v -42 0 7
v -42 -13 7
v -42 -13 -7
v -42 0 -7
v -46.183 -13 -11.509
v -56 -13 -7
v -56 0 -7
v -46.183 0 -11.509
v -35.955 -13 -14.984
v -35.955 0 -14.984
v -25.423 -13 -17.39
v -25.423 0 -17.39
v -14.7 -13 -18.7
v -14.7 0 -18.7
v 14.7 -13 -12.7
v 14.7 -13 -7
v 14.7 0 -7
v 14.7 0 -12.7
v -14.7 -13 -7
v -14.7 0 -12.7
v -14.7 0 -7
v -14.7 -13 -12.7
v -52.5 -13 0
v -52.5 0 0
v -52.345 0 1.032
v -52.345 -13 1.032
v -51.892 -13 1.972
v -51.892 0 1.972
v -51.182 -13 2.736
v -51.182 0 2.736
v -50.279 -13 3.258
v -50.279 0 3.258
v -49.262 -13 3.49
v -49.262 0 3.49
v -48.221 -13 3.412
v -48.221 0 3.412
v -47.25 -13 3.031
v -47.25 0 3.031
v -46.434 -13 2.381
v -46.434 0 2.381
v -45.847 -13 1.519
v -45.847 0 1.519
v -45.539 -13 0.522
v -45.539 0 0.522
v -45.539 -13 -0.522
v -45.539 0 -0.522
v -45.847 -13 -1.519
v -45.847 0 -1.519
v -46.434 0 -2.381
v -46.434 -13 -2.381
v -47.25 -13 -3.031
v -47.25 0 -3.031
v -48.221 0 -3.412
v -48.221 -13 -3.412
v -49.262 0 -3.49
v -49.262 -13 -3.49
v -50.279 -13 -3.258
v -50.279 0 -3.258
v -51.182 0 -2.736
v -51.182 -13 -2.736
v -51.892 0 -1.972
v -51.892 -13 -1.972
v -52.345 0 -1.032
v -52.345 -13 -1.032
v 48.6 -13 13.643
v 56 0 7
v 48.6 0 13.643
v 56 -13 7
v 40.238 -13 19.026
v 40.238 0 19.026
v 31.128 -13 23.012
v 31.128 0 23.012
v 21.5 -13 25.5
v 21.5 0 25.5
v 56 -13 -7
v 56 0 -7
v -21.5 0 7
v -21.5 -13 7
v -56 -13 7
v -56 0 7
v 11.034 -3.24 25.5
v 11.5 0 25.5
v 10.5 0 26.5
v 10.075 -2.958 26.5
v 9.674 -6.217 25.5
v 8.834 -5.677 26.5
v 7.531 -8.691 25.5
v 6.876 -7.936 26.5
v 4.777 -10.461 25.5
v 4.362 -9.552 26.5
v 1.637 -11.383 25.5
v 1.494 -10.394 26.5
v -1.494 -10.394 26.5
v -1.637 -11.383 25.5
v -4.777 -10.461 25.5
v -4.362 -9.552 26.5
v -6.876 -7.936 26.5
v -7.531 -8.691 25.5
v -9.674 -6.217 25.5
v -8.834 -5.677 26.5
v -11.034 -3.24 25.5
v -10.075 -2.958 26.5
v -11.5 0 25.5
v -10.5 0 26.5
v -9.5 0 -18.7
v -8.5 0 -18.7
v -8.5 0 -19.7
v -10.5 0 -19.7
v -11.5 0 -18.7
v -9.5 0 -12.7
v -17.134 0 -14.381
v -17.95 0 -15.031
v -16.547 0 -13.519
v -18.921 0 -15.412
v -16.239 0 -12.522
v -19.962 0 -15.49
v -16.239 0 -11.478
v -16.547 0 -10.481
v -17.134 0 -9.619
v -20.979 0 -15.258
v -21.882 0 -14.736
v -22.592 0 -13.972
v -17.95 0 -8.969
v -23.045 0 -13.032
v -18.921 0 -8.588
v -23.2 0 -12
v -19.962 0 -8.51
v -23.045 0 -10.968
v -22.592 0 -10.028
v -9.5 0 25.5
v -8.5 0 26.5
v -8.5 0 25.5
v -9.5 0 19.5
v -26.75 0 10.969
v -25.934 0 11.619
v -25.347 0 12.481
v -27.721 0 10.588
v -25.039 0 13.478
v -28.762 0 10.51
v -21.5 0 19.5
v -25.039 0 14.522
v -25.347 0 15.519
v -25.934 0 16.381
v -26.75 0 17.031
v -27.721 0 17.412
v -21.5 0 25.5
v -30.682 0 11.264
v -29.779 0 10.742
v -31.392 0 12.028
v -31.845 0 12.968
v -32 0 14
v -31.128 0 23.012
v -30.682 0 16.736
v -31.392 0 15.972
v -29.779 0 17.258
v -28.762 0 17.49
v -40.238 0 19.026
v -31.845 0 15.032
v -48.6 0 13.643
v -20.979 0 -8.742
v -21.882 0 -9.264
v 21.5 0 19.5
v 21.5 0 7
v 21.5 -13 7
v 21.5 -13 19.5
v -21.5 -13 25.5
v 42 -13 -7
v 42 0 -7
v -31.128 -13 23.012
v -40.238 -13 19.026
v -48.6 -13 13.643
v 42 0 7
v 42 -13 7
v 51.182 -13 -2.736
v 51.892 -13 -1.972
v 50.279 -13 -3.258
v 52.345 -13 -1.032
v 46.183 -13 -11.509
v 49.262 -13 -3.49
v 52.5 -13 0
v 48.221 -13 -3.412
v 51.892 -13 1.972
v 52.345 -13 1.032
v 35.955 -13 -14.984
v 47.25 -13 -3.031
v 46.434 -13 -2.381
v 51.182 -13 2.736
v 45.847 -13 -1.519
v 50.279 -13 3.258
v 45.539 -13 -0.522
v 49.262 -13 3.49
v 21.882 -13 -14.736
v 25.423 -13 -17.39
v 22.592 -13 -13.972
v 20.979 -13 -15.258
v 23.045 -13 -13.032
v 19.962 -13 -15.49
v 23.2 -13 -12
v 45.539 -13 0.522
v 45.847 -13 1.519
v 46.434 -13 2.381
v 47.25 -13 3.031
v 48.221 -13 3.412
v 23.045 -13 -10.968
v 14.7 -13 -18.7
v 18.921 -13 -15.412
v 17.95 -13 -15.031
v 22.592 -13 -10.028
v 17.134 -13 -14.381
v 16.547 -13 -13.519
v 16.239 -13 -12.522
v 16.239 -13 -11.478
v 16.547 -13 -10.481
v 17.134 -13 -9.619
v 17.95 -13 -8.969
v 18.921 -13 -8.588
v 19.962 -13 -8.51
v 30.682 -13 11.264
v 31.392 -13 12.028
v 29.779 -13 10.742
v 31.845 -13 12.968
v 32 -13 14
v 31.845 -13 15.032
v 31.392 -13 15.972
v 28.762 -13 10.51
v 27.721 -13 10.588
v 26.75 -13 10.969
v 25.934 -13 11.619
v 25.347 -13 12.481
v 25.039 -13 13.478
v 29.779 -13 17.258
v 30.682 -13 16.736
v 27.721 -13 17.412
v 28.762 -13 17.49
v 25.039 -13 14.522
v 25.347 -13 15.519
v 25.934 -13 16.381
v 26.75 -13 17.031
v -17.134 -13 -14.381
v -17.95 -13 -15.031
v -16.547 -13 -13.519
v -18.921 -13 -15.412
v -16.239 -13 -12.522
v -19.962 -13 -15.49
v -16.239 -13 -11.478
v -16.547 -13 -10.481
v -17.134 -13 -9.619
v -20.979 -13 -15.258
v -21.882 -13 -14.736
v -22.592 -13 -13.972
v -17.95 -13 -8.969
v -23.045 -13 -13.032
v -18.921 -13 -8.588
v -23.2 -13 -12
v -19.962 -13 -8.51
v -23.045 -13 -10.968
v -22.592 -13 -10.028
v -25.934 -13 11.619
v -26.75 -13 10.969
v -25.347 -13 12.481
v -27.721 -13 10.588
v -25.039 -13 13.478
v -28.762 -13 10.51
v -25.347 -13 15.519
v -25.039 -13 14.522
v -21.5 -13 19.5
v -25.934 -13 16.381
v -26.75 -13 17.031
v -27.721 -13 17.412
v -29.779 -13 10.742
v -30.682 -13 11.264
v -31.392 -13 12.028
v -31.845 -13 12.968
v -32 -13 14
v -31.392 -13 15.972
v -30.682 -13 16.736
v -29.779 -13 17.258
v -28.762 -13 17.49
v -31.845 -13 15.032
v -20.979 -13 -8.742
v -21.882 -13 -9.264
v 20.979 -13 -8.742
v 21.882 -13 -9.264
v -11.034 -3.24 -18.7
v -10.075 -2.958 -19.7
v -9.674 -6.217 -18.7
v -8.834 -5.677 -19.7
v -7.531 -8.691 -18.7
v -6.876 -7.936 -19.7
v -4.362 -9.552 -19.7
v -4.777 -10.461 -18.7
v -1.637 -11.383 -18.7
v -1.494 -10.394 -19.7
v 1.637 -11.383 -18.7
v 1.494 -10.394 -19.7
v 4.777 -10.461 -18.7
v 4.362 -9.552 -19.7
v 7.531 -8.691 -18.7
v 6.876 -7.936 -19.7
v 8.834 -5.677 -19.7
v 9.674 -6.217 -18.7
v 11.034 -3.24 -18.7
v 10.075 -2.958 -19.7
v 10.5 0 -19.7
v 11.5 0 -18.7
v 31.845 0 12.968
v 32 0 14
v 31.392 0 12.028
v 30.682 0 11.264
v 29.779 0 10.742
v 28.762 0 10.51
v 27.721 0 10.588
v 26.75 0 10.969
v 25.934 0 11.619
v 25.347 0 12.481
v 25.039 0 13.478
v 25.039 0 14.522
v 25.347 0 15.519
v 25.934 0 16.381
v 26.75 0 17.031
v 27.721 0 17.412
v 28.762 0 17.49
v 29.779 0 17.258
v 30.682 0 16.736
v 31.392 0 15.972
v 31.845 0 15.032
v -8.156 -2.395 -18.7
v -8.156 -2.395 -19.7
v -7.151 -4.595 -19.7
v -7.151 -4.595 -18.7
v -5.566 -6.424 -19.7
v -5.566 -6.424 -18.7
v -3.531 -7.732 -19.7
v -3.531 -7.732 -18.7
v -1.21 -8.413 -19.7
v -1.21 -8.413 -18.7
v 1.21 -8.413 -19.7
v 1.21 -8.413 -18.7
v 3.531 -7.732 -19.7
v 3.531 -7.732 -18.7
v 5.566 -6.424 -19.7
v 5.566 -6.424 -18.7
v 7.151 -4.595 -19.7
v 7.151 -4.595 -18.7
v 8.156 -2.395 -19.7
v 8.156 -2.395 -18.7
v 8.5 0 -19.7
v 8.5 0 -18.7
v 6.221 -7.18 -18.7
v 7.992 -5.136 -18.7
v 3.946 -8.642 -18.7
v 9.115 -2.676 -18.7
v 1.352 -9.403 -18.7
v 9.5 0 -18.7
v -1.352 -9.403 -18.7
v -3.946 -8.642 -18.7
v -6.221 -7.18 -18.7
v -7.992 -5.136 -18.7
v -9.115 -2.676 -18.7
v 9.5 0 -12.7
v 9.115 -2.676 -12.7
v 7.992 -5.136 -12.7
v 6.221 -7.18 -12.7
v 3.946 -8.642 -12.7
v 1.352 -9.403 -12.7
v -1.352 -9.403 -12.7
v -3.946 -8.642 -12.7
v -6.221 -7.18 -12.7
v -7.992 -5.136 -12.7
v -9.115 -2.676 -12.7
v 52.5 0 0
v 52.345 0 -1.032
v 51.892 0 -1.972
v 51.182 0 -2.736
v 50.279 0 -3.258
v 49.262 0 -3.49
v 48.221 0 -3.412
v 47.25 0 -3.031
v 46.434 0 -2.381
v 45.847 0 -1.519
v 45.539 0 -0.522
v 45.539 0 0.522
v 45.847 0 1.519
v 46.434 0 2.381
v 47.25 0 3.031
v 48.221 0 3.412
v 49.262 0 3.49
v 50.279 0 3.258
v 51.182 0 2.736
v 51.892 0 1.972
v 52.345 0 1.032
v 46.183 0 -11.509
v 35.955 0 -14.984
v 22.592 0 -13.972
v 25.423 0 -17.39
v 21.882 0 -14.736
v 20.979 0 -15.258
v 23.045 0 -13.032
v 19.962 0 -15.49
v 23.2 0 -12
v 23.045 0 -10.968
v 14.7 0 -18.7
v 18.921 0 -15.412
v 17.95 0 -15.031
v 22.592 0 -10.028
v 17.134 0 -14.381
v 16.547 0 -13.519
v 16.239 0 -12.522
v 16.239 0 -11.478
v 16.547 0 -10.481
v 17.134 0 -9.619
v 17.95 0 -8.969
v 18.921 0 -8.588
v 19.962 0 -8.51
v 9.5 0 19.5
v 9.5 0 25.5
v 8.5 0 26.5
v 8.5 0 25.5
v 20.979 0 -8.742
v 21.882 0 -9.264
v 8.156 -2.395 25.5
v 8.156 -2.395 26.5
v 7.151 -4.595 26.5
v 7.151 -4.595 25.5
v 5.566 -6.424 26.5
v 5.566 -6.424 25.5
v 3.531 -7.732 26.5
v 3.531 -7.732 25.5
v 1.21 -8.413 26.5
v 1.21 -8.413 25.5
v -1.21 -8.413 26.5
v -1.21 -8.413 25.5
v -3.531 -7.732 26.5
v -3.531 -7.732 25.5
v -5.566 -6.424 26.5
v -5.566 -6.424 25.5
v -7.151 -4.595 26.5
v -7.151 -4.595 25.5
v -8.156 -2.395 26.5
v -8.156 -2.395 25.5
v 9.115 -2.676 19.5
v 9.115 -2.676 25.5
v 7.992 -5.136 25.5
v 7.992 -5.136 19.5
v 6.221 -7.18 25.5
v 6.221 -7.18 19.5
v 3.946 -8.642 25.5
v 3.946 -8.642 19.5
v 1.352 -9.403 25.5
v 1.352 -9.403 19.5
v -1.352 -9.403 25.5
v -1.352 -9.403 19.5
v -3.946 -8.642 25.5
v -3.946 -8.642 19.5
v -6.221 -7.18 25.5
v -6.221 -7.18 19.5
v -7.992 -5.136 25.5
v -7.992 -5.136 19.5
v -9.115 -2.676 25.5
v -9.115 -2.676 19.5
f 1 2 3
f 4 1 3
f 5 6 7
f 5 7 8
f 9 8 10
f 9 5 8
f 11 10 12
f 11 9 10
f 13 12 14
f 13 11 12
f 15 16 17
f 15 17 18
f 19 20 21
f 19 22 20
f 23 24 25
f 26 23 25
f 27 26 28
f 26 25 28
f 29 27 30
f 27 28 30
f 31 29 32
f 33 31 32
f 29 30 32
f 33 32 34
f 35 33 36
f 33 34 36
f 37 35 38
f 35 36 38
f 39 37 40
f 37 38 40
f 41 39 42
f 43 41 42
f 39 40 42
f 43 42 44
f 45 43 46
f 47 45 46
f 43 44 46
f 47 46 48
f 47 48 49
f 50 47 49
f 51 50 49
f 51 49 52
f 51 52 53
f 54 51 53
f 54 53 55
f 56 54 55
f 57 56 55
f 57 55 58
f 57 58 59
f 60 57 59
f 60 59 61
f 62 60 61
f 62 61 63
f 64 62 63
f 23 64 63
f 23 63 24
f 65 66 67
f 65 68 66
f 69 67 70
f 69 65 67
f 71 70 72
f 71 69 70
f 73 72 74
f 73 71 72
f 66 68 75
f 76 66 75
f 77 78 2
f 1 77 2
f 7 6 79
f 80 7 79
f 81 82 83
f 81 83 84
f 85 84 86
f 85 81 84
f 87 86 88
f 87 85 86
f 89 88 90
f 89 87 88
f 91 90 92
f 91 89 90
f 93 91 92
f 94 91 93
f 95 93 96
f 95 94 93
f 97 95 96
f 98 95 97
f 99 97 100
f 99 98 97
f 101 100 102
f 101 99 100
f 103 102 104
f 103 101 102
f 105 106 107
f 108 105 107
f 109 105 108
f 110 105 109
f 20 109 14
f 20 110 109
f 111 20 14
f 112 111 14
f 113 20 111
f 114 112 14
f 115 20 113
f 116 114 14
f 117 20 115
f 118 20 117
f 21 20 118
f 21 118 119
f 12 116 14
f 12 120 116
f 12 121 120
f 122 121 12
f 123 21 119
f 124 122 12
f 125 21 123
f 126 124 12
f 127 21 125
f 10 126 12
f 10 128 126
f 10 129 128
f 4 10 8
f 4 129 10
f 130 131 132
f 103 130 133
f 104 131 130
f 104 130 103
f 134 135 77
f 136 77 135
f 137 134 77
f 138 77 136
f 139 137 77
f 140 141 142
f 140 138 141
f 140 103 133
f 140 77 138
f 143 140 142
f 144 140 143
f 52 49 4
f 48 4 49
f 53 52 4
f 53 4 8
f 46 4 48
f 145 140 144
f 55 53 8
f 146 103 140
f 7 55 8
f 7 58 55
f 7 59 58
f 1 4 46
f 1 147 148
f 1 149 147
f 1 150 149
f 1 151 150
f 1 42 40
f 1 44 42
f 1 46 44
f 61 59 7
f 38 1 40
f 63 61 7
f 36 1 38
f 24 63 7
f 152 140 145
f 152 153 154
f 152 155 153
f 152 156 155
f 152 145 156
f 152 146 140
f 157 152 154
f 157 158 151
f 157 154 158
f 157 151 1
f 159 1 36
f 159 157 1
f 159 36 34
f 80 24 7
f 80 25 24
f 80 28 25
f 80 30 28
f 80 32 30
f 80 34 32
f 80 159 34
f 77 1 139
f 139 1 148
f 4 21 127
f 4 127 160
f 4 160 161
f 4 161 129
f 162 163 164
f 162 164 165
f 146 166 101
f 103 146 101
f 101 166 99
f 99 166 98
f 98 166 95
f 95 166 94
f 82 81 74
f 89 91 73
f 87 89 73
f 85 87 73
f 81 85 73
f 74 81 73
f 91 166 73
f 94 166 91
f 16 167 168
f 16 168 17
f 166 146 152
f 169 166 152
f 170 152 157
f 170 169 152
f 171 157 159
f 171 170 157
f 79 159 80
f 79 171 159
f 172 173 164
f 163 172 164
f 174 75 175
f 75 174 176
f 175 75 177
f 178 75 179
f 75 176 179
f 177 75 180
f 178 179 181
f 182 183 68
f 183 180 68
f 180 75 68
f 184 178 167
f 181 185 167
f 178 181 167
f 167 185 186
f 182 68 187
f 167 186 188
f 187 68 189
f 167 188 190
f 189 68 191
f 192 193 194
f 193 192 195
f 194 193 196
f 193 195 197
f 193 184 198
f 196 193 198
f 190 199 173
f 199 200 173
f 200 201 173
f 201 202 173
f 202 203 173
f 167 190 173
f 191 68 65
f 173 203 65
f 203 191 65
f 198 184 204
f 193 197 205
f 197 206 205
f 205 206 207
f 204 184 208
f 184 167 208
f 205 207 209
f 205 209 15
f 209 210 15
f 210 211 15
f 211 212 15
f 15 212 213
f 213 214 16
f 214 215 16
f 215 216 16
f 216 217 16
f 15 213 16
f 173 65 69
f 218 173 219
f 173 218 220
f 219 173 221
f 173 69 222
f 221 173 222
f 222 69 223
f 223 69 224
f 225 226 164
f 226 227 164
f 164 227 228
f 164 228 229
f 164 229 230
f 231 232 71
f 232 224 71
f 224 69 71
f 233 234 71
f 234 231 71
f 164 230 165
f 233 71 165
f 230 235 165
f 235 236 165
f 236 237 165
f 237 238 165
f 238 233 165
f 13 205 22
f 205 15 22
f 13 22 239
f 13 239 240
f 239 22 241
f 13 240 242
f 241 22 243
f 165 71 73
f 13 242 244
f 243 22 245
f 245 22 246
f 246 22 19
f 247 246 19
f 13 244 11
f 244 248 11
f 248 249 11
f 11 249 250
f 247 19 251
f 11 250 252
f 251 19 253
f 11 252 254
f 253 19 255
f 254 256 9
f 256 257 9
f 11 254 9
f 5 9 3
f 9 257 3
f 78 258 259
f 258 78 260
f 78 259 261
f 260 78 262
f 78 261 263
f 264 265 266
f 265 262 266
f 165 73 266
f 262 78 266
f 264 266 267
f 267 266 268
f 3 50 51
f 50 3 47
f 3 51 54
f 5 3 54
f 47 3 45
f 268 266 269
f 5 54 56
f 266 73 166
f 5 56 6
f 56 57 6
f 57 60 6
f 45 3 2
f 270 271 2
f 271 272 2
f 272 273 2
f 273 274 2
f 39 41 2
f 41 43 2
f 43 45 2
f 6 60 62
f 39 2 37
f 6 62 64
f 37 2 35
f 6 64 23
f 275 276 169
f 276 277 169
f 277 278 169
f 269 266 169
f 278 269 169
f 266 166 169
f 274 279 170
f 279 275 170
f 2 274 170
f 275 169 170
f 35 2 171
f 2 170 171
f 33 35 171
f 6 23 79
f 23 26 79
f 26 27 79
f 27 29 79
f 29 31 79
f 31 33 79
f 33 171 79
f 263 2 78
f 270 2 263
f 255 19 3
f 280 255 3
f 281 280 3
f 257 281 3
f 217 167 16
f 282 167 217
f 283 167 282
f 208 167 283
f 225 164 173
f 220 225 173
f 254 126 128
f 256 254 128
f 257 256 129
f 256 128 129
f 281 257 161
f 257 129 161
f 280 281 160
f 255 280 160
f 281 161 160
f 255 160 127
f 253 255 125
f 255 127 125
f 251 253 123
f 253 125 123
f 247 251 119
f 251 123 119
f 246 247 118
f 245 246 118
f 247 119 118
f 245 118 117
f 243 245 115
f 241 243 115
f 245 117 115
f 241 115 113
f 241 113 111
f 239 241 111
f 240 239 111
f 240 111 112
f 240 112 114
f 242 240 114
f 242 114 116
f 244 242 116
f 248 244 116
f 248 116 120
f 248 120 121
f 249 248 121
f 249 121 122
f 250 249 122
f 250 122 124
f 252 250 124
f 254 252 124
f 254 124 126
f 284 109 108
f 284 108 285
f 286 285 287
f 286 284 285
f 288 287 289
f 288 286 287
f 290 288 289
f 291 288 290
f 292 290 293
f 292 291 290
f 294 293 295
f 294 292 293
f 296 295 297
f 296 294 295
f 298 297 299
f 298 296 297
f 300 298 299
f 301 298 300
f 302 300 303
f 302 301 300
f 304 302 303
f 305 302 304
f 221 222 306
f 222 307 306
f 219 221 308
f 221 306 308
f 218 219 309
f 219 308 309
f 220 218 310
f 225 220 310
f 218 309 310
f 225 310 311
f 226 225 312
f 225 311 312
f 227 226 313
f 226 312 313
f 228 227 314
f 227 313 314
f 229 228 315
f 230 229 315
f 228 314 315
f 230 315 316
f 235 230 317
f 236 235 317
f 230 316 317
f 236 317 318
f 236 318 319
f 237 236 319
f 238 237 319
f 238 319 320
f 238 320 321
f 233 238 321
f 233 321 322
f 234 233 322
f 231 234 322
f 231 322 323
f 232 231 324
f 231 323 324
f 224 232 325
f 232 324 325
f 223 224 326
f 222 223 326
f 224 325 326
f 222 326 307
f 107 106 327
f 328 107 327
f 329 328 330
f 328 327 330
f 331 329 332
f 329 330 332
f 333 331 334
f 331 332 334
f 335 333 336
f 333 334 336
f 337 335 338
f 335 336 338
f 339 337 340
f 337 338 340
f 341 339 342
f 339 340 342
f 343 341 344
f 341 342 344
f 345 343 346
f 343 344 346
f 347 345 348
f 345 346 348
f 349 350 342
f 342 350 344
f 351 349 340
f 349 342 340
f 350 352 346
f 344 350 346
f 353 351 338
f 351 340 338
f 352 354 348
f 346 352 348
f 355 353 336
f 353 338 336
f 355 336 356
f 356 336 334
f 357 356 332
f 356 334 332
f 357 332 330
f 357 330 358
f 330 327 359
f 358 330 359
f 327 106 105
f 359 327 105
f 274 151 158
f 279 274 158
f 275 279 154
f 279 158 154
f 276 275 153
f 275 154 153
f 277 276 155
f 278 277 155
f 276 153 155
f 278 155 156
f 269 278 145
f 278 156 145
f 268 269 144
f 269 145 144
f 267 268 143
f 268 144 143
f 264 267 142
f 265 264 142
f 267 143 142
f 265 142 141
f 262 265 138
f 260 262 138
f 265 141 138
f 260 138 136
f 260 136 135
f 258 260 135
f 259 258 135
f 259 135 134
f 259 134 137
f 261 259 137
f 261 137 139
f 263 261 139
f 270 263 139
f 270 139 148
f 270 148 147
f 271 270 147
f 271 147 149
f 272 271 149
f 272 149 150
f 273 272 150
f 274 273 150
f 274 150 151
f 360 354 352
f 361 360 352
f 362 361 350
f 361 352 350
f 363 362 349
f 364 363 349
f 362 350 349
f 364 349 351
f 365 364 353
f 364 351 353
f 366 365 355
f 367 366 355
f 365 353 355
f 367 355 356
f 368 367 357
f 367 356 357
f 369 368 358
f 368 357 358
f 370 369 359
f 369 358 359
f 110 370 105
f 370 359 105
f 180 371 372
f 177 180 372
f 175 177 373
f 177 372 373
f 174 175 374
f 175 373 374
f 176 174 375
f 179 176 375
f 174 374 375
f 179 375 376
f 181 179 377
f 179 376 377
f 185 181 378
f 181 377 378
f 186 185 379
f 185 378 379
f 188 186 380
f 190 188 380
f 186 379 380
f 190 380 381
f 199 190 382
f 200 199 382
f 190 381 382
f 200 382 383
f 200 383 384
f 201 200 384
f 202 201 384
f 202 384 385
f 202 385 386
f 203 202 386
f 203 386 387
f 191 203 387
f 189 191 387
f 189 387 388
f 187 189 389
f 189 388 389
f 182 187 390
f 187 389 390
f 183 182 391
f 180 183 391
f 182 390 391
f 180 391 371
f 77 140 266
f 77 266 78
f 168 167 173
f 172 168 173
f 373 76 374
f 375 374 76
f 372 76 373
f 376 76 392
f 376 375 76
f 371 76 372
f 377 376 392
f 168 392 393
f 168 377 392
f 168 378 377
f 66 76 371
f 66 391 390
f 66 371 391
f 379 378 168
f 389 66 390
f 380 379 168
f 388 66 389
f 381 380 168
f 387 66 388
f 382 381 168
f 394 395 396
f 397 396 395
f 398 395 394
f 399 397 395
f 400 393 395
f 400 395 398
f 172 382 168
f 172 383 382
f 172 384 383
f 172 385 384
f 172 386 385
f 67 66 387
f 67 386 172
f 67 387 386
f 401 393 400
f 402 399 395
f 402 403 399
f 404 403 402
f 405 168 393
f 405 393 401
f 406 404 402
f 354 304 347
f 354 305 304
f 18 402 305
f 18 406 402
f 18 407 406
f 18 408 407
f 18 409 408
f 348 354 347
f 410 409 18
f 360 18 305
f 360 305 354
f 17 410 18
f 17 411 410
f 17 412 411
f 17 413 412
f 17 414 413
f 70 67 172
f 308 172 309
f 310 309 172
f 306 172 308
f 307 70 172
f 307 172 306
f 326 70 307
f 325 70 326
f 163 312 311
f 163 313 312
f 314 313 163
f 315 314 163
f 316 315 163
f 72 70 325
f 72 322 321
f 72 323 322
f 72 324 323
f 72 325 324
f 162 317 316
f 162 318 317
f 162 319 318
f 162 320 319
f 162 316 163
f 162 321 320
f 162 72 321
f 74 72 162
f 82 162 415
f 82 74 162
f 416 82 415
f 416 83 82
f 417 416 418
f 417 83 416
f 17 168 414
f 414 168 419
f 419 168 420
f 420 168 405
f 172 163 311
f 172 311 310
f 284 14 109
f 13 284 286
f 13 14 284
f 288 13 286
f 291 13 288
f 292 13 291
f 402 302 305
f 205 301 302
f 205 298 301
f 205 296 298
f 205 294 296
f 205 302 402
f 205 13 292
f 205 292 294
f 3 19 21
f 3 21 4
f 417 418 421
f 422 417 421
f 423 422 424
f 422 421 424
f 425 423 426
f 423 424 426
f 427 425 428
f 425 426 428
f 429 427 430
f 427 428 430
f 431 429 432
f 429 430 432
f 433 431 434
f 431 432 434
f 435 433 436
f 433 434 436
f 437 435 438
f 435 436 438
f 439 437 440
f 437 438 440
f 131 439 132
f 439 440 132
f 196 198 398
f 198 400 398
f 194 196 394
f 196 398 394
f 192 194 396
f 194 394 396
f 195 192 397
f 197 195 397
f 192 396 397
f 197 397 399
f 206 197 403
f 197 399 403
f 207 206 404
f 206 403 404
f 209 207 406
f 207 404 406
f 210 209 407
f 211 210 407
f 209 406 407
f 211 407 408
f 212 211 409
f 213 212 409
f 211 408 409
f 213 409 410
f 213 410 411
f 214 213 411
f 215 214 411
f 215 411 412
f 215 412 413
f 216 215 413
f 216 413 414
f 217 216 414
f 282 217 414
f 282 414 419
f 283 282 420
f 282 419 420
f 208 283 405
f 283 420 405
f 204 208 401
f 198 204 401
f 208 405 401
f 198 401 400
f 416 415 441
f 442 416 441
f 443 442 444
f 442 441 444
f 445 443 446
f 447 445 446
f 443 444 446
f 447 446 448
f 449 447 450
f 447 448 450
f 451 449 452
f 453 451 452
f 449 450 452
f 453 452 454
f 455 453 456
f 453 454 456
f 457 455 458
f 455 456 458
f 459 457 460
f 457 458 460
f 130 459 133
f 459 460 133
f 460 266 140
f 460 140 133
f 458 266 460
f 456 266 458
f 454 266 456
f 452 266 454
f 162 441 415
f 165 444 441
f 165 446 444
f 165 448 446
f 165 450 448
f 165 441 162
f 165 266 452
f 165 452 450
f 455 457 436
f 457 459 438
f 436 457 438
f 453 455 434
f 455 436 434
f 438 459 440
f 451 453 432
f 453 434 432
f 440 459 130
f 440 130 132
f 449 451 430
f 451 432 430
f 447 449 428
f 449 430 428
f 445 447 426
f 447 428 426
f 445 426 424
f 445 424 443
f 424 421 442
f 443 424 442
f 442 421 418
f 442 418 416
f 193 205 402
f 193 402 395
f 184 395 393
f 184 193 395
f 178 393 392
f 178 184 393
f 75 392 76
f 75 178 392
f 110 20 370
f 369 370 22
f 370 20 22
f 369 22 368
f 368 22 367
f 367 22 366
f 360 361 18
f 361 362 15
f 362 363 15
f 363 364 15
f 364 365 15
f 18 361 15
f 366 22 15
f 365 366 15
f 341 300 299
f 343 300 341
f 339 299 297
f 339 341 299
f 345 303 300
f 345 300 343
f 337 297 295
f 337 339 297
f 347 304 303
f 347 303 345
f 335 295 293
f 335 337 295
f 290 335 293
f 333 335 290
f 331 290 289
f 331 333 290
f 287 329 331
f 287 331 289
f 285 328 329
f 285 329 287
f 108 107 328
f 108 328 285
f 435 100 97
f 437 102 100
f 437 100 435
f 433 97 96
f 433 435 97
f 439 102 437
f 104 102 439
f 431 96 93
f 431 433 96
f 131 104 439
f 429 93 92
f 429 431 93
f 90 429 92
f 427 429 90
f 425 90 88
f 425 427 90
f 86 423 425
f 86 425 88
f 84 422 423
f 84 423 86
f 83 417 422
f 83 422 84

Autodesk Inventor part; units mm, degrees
ref_plane "YZ Plane" through (0, 0, 0) normal (1, 0, 0) x (0, 1, 0)
ref_plane "XZ Plane" through (0, 0, 0) normal (0, 1, 0) x (-1, 0, 0)
ref_plane "XY Plane" through (0, 0, 0) normal (0, 0, 1) x (1, 0, 0)
sketch "Esquisse1" plane through (0, 0, 0) normal (0, 1, 0) x (-1, 0, 0)
  line L0 (0, 5) -> (40, 5)
  line L1 (40, 5) -> (40, -5)
  line L2 (40, -5) -> (0, -5)
  line L3 (0, -5) -> (0, 5)
  line L4 (0, 5) -> (17.5, 5)
  line L5 (17.5, 5) -> (17.5, 19)
  line L6 (17.5, 19) -> (0, 19)
  line L7 (0, 19) -> (0, 5)
  line L8 (0, -5) -> (12.7, -5)
  line L9 (12.7, -5) -> (12.7, -12.2)
  line L10 (12.7, -12.2) -> (0, -12.2)
  line L11 (0, -12.2) -> (0, -5)
  line L12 (17.5, 5) -> (21.5, 5)
  line L13 (21.5, 5) -> (21.5, 7)
  line L14 (21.5, 7) -> (17.5, 7)
  line L15 (17.5, 7) -> (17.5, 5)
  line L16 (12.7, -5) -> (14.7, -5)
  line L17 (14.7, -5) -> (14.7, -7)
  line L18 (14.7, -7) -> (12.7, -7)
  line L19 (12.7, -7) -> (12.7, -5)
  line L20 (40, -5) -> (14.7, -5)
  line L21 (14.7, -5) -> (14.7, -7)
  line L22 (14.7, -7) -> (40, -7)
  line L23 (40, -7) -> (40, -5)
  line L24 (12.7, -12.2) -> (14.7, -12.2)
  line L25 (14.7, -12.2) -> (14.7, -7)
  line L26 (14.7, -7) -> (12.7, -7)
  line L27 (12.7, -7) -> (12.7, -12.2)
  line L28 (40, 5) -> (21.5, 5)
  line L29 (21.5, 5) -> (21.5, 7)
  line L30 (21.5, 7) -> (40, 7)
  line L31 (40, 7) -> (40, 5)
  line L32 (21.5, 7) -> (17.5, 7)
  line L33 (17.5, 7) -> (17.5, 19)
  line L34 (17.5, 19) -> (21.5, 19)
  line L35 (21.5, 19) -> (21.5, 7)
  line L36 (40, -5) -> (42, -5)
  line L37 (42, -5) -> (42, 5)
  line L38 (42, 5) -> (40, 5)
  line L39 (40, 5) -> (40, -5)
  line L40 (0, -12.2) -> (12.7, -12.2)
  line L41 (12.7, -12.2) -> (12.7, -12.7)
  line L42 (12.7, -12.7) -> (0, -12.7)
  line L43 (0, -12.7) -> (0, -12.2)
  line L44 (0, 19) -> (17.5, 19)
  line L45 (17.5, 19) -> (17.5, 19.5)
  line L46 (17.5, 19.5) -> (0, 19.5)
  line L47 (0, 19.5) -> (0, 19)
  line L48 (21.5, 19) -> (17.5, 19)
  line L49 (17.5, 19) -> (17.5, 19.5)
  line L50 (17.5, 19.5) -> (21.5, 19.5)
  line L51 (21.5, 19.5) -> (21.5, 19)
  line L52 (42, 5) -> (40, 5)
  line L53 (40, 5) -> (40, 7)
  line L54 (40, 7) -> (42, 7)
  line L55 (42, 7) -> (42, 5)
  line L56 (42, -5) -> (40, -5)
  line L57 (40, -5) -> (40, -7)
  line L58 (40, -7) -> (42, -7)
  line L59 (42, -7) -> (42, -5)
  line L60 (14.7, -12.2) -> (12.7, -12.2)
  line L61 (12.7, -12.2) -> (12.7, -12.7)
  line L62 (12.7, -12.7) -> (14.7, -12.7)
  line L63 (14.7, -12.7) -> (14.7, -12.2)
  line L64 (0, 19.5) -> (21.5, 19.5)
  line L65 (21.5, 19.5) -> (21.5, 25.5)
  line L66 (21.5, 25.5) -> (0, 25.5)
  line L67 (0, 25.5) -> (0, 19.5)
  line L68 (0, -12.7) -> (14.7, -12.7)
  line L69 (14.7, -12.7) -> (14.7, -18.7)
  line L70 (14.7, -18.7) -> (0, -18.7)
  line L71 (0, -18.7) -> (0, -12.7)
  line L72 (42, -7) -> (56, -7)
  line L73 (56, -7) -> (56, 7)
  line L74 (56, 7) -> (42, 7)
  line L75 (42, 7) -> (42, -7)
  arc A0 (56, 7) -> (21.5, 25.5) centre (10.75, -35.9662) ccw
  arc A1 (21.5, 25.5) -> (0, 25.5) centre (10.75, -35.9662) ccw construction
  arc A2 (0, -18.7) -> (14.7, -18.7) centre (7.35, 85.9876) ccw construction
  arc A3 (14.7, -18.7) -> (56, -7) centre (7.35, 85.9876) ccw
  point P0 (0, 0)
  point P1 (0, 0)
  dimension "d1" = 40
  dimension "d3" = 14
  dimension "d4" = 10
  dimension "d5" = 7.2
  dimension "d6" = 0.5
  dimension "d7" = 0.5
  dimension "d8" = 17.5
  dimension "d9" = 12.7
  dimension "d10" = 2
  dimension "d11" = 2
  dimension "d12" = 2
  dimension "d13" = 4
  dimension "d14" = 2
  dimension "d15" = 6
  dimension "d16" = 6
  dimension "d17" = 14
extrude "Extrusion1" add sketch "Esquisse1" along normal mid plane 26 contours L67 L66 L65 L50 L46 | L35 L51 L65 A0 L74 L54 L30 | L42 L62 L69 L70 L71 | L55 L74 L73 L72 L59 L37 | L22 L58 L72 A3 L69 L63 L25
mirror "Symétrie1" about plane through (0, 0, 0) normal (1, 0, 0) of "Extrusion1"
sketch "Esquisse4" plane through (-14.7, -13, -18.7) normal (0, 0, -1) x (-1, 0, 0)
  circle A0 centre (-14.7, 13) radius 9.5
  dimension "d25" = 19
extrude "Extrusion4" cut sketch "Esquisse4" against normal through all
sketch "Esquisse5" plane through (0, 13, 0) normal (0, 1, 0) x (1, 0, 0)
  circle A0 centre (19.7, 12) radius 3.5
  circle A1 centre (28.5, -14) radius 3.5
  line L0 (42, 7) -> (56, -7) construction
  line L1 (56, 7) -> (42, -7) construction
  circle A2 centre (49, 0) radius 3.5
  line L2 (21.5, -7) -> (35.5, -7) construction
  line L3 (35.5, -7) -> (35.5, -21) construction
  line L4 (35.5, -21) -> (21.5, -21) construction
  line L5 (21.5, -21) -> (21.5, -7) construction
  line L6 (14.7, 7) -> (24.7, 7) construction
  line L7 (24.7, 7) -> (24.7, 17) construction
  line L8 (24.7, 17) -> (14.7, 17) construction
  line L9 (14.7, 17) -> (14.7, 7) construction
  line L10 (14.7, 17) -> (24.7, 7) construction
  line L11 (24.7, 17) -> (14.7, 7) construction
  line L12 (21.5, -7) -> (35.5, -21) construction
  line L13 (35.5, -7) -> (21.5, -21) construction
  point P0 (0, 0)
  dimension "d28" = 7
  dimension "d29" = 7
  dimension "d36" = 7
  dimension "d37" = 10
  dimension "d38" = 10
  dimension "d39" = 14
  dimension "d40" = 14
  dimension "d41" = 14
  dimension "d60" = 28.5
extrude "Extrusion5" cut sketch "Esquisse5" against normal through all
mirror "Symétrie3" about plane through (0, 0, 0) normal (1, 0, 0) of "Extrusion5"
sketch "Esquisse7" plane through (-21.5, -13, 25.5) normal (0, 0, 1) x (1, 0, 0)
  circle A0 centre (21.5, 13) radius 9.5 projected
  circle A1 centre (21.5, 13) radius 8.5
  circle A2 centre (21.5, 13) radius 11.5
  dimension "d44" = 1
  dimension "d45" = 2
extrude "Extrusion7" add sketch "Esquisse7" along normal blind 1 contours A0 | A2
chamfer "Chanfrein1" distance 1 angle 45 1 edges at (-11.5, 0, 26.5)
sketch "Esquisse8" plane through (-14.7, -13, -18.7) normal (0, 0, -1) x (-1, 0, 0)
  circle A0 centre (-14.7, 13) radius 9.5 projected
  circle A1 centre (-14.7, 13) radius 11.5
  circle A2 centre (-14.7, 13) radius 8.5
  dimension "d51" = 1
  dimension "d52" = 2
extrude "Extrusion8" add sketch "Esquisse8" along normal blind 1 contours A0 | A1
chamfer "Chanfrein2" distance 1 angle 45 1 edges at (11.5, 0, -19.7)
sketch "Esquisse9" plane through (0, 0, 26.5) normal (0, 0, 1) x (1, 0, 0)
  circle A0 centre (0, 0) radius 8.5 projected
  line L0 (-56, 13) -> (56, 13)
  line L1 (56, 13) -> (56, 0)
  line L2 (56, 0) -> (-56, 0)
  line L3 (-56, 0) -> (-56, 13)
  line L4 (-56, -13) -> (-56, 13) projected
  line L5 (56, -13) -> (56, 13) projected
  line L6 (-21.5, 13) -> (21.5, 13) projected
extrude "Extrusion9" cut sketch "Esquisse9" against normal through all contours L2 A0 | A0 L2 L3 L0 L1 picked at (2.1208, 1.8788)
properties part number "wheel_base"
